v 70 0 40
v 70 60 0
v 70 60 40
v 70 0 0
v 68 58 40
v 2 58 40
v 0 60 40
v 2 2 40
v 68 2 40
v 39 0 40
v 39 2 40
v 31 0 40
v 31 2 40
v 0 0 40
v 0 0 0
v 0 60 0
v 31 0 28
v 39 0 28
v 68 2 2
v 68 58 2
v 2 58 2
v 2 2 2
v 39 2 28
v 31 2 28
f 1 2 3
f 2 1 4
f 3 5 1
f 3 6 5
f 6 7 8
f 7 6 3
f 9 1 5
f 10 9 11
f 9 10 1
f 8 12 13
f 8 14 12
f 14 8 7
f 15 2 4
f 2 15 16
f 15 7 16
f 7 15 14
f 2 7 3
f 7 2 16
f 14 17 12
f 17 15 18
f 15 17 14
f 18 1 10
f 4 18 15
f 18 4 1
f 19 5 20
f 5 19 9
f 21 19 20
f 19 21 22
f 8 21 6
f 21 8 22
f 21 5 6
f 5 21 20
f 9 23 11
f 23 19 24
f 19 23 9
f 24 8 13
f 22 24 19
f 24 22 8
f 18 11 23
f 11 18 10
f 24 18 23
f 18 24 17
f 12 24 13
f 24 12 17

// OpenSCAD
$fn = 32;

// ----------------------------------------------------------------------
// Enclosure box: notch enclosure
// ----------------------------------------------------------------------

// --- parameters (mm) ---
box_l = 70;               // outer length, X
box_w = 60;               // outer width, Y
box_h = 40;               // outer height
wall_t = 2;               // wall thickness
notch_w = 8;              // cable notch width
notch_h = 12;             // cable notch height

inner_h = box_h - wall_t;  // cavity depth
boss_h = inner_h - 2;  // corner boss height

difference() {
  cube([box_l, box_w, box_h]);
  translate([wall_t, wall_t, wall_t])
    cube([box_l - 2 * wall_t, box_w - 2 * wall_t, box_h]);
  translate([box_l / 2 - notch_w / 2, -1, box_h - notch_h])
    cube([notch_w, wall_t + 2, notch_h + 1]);
}
